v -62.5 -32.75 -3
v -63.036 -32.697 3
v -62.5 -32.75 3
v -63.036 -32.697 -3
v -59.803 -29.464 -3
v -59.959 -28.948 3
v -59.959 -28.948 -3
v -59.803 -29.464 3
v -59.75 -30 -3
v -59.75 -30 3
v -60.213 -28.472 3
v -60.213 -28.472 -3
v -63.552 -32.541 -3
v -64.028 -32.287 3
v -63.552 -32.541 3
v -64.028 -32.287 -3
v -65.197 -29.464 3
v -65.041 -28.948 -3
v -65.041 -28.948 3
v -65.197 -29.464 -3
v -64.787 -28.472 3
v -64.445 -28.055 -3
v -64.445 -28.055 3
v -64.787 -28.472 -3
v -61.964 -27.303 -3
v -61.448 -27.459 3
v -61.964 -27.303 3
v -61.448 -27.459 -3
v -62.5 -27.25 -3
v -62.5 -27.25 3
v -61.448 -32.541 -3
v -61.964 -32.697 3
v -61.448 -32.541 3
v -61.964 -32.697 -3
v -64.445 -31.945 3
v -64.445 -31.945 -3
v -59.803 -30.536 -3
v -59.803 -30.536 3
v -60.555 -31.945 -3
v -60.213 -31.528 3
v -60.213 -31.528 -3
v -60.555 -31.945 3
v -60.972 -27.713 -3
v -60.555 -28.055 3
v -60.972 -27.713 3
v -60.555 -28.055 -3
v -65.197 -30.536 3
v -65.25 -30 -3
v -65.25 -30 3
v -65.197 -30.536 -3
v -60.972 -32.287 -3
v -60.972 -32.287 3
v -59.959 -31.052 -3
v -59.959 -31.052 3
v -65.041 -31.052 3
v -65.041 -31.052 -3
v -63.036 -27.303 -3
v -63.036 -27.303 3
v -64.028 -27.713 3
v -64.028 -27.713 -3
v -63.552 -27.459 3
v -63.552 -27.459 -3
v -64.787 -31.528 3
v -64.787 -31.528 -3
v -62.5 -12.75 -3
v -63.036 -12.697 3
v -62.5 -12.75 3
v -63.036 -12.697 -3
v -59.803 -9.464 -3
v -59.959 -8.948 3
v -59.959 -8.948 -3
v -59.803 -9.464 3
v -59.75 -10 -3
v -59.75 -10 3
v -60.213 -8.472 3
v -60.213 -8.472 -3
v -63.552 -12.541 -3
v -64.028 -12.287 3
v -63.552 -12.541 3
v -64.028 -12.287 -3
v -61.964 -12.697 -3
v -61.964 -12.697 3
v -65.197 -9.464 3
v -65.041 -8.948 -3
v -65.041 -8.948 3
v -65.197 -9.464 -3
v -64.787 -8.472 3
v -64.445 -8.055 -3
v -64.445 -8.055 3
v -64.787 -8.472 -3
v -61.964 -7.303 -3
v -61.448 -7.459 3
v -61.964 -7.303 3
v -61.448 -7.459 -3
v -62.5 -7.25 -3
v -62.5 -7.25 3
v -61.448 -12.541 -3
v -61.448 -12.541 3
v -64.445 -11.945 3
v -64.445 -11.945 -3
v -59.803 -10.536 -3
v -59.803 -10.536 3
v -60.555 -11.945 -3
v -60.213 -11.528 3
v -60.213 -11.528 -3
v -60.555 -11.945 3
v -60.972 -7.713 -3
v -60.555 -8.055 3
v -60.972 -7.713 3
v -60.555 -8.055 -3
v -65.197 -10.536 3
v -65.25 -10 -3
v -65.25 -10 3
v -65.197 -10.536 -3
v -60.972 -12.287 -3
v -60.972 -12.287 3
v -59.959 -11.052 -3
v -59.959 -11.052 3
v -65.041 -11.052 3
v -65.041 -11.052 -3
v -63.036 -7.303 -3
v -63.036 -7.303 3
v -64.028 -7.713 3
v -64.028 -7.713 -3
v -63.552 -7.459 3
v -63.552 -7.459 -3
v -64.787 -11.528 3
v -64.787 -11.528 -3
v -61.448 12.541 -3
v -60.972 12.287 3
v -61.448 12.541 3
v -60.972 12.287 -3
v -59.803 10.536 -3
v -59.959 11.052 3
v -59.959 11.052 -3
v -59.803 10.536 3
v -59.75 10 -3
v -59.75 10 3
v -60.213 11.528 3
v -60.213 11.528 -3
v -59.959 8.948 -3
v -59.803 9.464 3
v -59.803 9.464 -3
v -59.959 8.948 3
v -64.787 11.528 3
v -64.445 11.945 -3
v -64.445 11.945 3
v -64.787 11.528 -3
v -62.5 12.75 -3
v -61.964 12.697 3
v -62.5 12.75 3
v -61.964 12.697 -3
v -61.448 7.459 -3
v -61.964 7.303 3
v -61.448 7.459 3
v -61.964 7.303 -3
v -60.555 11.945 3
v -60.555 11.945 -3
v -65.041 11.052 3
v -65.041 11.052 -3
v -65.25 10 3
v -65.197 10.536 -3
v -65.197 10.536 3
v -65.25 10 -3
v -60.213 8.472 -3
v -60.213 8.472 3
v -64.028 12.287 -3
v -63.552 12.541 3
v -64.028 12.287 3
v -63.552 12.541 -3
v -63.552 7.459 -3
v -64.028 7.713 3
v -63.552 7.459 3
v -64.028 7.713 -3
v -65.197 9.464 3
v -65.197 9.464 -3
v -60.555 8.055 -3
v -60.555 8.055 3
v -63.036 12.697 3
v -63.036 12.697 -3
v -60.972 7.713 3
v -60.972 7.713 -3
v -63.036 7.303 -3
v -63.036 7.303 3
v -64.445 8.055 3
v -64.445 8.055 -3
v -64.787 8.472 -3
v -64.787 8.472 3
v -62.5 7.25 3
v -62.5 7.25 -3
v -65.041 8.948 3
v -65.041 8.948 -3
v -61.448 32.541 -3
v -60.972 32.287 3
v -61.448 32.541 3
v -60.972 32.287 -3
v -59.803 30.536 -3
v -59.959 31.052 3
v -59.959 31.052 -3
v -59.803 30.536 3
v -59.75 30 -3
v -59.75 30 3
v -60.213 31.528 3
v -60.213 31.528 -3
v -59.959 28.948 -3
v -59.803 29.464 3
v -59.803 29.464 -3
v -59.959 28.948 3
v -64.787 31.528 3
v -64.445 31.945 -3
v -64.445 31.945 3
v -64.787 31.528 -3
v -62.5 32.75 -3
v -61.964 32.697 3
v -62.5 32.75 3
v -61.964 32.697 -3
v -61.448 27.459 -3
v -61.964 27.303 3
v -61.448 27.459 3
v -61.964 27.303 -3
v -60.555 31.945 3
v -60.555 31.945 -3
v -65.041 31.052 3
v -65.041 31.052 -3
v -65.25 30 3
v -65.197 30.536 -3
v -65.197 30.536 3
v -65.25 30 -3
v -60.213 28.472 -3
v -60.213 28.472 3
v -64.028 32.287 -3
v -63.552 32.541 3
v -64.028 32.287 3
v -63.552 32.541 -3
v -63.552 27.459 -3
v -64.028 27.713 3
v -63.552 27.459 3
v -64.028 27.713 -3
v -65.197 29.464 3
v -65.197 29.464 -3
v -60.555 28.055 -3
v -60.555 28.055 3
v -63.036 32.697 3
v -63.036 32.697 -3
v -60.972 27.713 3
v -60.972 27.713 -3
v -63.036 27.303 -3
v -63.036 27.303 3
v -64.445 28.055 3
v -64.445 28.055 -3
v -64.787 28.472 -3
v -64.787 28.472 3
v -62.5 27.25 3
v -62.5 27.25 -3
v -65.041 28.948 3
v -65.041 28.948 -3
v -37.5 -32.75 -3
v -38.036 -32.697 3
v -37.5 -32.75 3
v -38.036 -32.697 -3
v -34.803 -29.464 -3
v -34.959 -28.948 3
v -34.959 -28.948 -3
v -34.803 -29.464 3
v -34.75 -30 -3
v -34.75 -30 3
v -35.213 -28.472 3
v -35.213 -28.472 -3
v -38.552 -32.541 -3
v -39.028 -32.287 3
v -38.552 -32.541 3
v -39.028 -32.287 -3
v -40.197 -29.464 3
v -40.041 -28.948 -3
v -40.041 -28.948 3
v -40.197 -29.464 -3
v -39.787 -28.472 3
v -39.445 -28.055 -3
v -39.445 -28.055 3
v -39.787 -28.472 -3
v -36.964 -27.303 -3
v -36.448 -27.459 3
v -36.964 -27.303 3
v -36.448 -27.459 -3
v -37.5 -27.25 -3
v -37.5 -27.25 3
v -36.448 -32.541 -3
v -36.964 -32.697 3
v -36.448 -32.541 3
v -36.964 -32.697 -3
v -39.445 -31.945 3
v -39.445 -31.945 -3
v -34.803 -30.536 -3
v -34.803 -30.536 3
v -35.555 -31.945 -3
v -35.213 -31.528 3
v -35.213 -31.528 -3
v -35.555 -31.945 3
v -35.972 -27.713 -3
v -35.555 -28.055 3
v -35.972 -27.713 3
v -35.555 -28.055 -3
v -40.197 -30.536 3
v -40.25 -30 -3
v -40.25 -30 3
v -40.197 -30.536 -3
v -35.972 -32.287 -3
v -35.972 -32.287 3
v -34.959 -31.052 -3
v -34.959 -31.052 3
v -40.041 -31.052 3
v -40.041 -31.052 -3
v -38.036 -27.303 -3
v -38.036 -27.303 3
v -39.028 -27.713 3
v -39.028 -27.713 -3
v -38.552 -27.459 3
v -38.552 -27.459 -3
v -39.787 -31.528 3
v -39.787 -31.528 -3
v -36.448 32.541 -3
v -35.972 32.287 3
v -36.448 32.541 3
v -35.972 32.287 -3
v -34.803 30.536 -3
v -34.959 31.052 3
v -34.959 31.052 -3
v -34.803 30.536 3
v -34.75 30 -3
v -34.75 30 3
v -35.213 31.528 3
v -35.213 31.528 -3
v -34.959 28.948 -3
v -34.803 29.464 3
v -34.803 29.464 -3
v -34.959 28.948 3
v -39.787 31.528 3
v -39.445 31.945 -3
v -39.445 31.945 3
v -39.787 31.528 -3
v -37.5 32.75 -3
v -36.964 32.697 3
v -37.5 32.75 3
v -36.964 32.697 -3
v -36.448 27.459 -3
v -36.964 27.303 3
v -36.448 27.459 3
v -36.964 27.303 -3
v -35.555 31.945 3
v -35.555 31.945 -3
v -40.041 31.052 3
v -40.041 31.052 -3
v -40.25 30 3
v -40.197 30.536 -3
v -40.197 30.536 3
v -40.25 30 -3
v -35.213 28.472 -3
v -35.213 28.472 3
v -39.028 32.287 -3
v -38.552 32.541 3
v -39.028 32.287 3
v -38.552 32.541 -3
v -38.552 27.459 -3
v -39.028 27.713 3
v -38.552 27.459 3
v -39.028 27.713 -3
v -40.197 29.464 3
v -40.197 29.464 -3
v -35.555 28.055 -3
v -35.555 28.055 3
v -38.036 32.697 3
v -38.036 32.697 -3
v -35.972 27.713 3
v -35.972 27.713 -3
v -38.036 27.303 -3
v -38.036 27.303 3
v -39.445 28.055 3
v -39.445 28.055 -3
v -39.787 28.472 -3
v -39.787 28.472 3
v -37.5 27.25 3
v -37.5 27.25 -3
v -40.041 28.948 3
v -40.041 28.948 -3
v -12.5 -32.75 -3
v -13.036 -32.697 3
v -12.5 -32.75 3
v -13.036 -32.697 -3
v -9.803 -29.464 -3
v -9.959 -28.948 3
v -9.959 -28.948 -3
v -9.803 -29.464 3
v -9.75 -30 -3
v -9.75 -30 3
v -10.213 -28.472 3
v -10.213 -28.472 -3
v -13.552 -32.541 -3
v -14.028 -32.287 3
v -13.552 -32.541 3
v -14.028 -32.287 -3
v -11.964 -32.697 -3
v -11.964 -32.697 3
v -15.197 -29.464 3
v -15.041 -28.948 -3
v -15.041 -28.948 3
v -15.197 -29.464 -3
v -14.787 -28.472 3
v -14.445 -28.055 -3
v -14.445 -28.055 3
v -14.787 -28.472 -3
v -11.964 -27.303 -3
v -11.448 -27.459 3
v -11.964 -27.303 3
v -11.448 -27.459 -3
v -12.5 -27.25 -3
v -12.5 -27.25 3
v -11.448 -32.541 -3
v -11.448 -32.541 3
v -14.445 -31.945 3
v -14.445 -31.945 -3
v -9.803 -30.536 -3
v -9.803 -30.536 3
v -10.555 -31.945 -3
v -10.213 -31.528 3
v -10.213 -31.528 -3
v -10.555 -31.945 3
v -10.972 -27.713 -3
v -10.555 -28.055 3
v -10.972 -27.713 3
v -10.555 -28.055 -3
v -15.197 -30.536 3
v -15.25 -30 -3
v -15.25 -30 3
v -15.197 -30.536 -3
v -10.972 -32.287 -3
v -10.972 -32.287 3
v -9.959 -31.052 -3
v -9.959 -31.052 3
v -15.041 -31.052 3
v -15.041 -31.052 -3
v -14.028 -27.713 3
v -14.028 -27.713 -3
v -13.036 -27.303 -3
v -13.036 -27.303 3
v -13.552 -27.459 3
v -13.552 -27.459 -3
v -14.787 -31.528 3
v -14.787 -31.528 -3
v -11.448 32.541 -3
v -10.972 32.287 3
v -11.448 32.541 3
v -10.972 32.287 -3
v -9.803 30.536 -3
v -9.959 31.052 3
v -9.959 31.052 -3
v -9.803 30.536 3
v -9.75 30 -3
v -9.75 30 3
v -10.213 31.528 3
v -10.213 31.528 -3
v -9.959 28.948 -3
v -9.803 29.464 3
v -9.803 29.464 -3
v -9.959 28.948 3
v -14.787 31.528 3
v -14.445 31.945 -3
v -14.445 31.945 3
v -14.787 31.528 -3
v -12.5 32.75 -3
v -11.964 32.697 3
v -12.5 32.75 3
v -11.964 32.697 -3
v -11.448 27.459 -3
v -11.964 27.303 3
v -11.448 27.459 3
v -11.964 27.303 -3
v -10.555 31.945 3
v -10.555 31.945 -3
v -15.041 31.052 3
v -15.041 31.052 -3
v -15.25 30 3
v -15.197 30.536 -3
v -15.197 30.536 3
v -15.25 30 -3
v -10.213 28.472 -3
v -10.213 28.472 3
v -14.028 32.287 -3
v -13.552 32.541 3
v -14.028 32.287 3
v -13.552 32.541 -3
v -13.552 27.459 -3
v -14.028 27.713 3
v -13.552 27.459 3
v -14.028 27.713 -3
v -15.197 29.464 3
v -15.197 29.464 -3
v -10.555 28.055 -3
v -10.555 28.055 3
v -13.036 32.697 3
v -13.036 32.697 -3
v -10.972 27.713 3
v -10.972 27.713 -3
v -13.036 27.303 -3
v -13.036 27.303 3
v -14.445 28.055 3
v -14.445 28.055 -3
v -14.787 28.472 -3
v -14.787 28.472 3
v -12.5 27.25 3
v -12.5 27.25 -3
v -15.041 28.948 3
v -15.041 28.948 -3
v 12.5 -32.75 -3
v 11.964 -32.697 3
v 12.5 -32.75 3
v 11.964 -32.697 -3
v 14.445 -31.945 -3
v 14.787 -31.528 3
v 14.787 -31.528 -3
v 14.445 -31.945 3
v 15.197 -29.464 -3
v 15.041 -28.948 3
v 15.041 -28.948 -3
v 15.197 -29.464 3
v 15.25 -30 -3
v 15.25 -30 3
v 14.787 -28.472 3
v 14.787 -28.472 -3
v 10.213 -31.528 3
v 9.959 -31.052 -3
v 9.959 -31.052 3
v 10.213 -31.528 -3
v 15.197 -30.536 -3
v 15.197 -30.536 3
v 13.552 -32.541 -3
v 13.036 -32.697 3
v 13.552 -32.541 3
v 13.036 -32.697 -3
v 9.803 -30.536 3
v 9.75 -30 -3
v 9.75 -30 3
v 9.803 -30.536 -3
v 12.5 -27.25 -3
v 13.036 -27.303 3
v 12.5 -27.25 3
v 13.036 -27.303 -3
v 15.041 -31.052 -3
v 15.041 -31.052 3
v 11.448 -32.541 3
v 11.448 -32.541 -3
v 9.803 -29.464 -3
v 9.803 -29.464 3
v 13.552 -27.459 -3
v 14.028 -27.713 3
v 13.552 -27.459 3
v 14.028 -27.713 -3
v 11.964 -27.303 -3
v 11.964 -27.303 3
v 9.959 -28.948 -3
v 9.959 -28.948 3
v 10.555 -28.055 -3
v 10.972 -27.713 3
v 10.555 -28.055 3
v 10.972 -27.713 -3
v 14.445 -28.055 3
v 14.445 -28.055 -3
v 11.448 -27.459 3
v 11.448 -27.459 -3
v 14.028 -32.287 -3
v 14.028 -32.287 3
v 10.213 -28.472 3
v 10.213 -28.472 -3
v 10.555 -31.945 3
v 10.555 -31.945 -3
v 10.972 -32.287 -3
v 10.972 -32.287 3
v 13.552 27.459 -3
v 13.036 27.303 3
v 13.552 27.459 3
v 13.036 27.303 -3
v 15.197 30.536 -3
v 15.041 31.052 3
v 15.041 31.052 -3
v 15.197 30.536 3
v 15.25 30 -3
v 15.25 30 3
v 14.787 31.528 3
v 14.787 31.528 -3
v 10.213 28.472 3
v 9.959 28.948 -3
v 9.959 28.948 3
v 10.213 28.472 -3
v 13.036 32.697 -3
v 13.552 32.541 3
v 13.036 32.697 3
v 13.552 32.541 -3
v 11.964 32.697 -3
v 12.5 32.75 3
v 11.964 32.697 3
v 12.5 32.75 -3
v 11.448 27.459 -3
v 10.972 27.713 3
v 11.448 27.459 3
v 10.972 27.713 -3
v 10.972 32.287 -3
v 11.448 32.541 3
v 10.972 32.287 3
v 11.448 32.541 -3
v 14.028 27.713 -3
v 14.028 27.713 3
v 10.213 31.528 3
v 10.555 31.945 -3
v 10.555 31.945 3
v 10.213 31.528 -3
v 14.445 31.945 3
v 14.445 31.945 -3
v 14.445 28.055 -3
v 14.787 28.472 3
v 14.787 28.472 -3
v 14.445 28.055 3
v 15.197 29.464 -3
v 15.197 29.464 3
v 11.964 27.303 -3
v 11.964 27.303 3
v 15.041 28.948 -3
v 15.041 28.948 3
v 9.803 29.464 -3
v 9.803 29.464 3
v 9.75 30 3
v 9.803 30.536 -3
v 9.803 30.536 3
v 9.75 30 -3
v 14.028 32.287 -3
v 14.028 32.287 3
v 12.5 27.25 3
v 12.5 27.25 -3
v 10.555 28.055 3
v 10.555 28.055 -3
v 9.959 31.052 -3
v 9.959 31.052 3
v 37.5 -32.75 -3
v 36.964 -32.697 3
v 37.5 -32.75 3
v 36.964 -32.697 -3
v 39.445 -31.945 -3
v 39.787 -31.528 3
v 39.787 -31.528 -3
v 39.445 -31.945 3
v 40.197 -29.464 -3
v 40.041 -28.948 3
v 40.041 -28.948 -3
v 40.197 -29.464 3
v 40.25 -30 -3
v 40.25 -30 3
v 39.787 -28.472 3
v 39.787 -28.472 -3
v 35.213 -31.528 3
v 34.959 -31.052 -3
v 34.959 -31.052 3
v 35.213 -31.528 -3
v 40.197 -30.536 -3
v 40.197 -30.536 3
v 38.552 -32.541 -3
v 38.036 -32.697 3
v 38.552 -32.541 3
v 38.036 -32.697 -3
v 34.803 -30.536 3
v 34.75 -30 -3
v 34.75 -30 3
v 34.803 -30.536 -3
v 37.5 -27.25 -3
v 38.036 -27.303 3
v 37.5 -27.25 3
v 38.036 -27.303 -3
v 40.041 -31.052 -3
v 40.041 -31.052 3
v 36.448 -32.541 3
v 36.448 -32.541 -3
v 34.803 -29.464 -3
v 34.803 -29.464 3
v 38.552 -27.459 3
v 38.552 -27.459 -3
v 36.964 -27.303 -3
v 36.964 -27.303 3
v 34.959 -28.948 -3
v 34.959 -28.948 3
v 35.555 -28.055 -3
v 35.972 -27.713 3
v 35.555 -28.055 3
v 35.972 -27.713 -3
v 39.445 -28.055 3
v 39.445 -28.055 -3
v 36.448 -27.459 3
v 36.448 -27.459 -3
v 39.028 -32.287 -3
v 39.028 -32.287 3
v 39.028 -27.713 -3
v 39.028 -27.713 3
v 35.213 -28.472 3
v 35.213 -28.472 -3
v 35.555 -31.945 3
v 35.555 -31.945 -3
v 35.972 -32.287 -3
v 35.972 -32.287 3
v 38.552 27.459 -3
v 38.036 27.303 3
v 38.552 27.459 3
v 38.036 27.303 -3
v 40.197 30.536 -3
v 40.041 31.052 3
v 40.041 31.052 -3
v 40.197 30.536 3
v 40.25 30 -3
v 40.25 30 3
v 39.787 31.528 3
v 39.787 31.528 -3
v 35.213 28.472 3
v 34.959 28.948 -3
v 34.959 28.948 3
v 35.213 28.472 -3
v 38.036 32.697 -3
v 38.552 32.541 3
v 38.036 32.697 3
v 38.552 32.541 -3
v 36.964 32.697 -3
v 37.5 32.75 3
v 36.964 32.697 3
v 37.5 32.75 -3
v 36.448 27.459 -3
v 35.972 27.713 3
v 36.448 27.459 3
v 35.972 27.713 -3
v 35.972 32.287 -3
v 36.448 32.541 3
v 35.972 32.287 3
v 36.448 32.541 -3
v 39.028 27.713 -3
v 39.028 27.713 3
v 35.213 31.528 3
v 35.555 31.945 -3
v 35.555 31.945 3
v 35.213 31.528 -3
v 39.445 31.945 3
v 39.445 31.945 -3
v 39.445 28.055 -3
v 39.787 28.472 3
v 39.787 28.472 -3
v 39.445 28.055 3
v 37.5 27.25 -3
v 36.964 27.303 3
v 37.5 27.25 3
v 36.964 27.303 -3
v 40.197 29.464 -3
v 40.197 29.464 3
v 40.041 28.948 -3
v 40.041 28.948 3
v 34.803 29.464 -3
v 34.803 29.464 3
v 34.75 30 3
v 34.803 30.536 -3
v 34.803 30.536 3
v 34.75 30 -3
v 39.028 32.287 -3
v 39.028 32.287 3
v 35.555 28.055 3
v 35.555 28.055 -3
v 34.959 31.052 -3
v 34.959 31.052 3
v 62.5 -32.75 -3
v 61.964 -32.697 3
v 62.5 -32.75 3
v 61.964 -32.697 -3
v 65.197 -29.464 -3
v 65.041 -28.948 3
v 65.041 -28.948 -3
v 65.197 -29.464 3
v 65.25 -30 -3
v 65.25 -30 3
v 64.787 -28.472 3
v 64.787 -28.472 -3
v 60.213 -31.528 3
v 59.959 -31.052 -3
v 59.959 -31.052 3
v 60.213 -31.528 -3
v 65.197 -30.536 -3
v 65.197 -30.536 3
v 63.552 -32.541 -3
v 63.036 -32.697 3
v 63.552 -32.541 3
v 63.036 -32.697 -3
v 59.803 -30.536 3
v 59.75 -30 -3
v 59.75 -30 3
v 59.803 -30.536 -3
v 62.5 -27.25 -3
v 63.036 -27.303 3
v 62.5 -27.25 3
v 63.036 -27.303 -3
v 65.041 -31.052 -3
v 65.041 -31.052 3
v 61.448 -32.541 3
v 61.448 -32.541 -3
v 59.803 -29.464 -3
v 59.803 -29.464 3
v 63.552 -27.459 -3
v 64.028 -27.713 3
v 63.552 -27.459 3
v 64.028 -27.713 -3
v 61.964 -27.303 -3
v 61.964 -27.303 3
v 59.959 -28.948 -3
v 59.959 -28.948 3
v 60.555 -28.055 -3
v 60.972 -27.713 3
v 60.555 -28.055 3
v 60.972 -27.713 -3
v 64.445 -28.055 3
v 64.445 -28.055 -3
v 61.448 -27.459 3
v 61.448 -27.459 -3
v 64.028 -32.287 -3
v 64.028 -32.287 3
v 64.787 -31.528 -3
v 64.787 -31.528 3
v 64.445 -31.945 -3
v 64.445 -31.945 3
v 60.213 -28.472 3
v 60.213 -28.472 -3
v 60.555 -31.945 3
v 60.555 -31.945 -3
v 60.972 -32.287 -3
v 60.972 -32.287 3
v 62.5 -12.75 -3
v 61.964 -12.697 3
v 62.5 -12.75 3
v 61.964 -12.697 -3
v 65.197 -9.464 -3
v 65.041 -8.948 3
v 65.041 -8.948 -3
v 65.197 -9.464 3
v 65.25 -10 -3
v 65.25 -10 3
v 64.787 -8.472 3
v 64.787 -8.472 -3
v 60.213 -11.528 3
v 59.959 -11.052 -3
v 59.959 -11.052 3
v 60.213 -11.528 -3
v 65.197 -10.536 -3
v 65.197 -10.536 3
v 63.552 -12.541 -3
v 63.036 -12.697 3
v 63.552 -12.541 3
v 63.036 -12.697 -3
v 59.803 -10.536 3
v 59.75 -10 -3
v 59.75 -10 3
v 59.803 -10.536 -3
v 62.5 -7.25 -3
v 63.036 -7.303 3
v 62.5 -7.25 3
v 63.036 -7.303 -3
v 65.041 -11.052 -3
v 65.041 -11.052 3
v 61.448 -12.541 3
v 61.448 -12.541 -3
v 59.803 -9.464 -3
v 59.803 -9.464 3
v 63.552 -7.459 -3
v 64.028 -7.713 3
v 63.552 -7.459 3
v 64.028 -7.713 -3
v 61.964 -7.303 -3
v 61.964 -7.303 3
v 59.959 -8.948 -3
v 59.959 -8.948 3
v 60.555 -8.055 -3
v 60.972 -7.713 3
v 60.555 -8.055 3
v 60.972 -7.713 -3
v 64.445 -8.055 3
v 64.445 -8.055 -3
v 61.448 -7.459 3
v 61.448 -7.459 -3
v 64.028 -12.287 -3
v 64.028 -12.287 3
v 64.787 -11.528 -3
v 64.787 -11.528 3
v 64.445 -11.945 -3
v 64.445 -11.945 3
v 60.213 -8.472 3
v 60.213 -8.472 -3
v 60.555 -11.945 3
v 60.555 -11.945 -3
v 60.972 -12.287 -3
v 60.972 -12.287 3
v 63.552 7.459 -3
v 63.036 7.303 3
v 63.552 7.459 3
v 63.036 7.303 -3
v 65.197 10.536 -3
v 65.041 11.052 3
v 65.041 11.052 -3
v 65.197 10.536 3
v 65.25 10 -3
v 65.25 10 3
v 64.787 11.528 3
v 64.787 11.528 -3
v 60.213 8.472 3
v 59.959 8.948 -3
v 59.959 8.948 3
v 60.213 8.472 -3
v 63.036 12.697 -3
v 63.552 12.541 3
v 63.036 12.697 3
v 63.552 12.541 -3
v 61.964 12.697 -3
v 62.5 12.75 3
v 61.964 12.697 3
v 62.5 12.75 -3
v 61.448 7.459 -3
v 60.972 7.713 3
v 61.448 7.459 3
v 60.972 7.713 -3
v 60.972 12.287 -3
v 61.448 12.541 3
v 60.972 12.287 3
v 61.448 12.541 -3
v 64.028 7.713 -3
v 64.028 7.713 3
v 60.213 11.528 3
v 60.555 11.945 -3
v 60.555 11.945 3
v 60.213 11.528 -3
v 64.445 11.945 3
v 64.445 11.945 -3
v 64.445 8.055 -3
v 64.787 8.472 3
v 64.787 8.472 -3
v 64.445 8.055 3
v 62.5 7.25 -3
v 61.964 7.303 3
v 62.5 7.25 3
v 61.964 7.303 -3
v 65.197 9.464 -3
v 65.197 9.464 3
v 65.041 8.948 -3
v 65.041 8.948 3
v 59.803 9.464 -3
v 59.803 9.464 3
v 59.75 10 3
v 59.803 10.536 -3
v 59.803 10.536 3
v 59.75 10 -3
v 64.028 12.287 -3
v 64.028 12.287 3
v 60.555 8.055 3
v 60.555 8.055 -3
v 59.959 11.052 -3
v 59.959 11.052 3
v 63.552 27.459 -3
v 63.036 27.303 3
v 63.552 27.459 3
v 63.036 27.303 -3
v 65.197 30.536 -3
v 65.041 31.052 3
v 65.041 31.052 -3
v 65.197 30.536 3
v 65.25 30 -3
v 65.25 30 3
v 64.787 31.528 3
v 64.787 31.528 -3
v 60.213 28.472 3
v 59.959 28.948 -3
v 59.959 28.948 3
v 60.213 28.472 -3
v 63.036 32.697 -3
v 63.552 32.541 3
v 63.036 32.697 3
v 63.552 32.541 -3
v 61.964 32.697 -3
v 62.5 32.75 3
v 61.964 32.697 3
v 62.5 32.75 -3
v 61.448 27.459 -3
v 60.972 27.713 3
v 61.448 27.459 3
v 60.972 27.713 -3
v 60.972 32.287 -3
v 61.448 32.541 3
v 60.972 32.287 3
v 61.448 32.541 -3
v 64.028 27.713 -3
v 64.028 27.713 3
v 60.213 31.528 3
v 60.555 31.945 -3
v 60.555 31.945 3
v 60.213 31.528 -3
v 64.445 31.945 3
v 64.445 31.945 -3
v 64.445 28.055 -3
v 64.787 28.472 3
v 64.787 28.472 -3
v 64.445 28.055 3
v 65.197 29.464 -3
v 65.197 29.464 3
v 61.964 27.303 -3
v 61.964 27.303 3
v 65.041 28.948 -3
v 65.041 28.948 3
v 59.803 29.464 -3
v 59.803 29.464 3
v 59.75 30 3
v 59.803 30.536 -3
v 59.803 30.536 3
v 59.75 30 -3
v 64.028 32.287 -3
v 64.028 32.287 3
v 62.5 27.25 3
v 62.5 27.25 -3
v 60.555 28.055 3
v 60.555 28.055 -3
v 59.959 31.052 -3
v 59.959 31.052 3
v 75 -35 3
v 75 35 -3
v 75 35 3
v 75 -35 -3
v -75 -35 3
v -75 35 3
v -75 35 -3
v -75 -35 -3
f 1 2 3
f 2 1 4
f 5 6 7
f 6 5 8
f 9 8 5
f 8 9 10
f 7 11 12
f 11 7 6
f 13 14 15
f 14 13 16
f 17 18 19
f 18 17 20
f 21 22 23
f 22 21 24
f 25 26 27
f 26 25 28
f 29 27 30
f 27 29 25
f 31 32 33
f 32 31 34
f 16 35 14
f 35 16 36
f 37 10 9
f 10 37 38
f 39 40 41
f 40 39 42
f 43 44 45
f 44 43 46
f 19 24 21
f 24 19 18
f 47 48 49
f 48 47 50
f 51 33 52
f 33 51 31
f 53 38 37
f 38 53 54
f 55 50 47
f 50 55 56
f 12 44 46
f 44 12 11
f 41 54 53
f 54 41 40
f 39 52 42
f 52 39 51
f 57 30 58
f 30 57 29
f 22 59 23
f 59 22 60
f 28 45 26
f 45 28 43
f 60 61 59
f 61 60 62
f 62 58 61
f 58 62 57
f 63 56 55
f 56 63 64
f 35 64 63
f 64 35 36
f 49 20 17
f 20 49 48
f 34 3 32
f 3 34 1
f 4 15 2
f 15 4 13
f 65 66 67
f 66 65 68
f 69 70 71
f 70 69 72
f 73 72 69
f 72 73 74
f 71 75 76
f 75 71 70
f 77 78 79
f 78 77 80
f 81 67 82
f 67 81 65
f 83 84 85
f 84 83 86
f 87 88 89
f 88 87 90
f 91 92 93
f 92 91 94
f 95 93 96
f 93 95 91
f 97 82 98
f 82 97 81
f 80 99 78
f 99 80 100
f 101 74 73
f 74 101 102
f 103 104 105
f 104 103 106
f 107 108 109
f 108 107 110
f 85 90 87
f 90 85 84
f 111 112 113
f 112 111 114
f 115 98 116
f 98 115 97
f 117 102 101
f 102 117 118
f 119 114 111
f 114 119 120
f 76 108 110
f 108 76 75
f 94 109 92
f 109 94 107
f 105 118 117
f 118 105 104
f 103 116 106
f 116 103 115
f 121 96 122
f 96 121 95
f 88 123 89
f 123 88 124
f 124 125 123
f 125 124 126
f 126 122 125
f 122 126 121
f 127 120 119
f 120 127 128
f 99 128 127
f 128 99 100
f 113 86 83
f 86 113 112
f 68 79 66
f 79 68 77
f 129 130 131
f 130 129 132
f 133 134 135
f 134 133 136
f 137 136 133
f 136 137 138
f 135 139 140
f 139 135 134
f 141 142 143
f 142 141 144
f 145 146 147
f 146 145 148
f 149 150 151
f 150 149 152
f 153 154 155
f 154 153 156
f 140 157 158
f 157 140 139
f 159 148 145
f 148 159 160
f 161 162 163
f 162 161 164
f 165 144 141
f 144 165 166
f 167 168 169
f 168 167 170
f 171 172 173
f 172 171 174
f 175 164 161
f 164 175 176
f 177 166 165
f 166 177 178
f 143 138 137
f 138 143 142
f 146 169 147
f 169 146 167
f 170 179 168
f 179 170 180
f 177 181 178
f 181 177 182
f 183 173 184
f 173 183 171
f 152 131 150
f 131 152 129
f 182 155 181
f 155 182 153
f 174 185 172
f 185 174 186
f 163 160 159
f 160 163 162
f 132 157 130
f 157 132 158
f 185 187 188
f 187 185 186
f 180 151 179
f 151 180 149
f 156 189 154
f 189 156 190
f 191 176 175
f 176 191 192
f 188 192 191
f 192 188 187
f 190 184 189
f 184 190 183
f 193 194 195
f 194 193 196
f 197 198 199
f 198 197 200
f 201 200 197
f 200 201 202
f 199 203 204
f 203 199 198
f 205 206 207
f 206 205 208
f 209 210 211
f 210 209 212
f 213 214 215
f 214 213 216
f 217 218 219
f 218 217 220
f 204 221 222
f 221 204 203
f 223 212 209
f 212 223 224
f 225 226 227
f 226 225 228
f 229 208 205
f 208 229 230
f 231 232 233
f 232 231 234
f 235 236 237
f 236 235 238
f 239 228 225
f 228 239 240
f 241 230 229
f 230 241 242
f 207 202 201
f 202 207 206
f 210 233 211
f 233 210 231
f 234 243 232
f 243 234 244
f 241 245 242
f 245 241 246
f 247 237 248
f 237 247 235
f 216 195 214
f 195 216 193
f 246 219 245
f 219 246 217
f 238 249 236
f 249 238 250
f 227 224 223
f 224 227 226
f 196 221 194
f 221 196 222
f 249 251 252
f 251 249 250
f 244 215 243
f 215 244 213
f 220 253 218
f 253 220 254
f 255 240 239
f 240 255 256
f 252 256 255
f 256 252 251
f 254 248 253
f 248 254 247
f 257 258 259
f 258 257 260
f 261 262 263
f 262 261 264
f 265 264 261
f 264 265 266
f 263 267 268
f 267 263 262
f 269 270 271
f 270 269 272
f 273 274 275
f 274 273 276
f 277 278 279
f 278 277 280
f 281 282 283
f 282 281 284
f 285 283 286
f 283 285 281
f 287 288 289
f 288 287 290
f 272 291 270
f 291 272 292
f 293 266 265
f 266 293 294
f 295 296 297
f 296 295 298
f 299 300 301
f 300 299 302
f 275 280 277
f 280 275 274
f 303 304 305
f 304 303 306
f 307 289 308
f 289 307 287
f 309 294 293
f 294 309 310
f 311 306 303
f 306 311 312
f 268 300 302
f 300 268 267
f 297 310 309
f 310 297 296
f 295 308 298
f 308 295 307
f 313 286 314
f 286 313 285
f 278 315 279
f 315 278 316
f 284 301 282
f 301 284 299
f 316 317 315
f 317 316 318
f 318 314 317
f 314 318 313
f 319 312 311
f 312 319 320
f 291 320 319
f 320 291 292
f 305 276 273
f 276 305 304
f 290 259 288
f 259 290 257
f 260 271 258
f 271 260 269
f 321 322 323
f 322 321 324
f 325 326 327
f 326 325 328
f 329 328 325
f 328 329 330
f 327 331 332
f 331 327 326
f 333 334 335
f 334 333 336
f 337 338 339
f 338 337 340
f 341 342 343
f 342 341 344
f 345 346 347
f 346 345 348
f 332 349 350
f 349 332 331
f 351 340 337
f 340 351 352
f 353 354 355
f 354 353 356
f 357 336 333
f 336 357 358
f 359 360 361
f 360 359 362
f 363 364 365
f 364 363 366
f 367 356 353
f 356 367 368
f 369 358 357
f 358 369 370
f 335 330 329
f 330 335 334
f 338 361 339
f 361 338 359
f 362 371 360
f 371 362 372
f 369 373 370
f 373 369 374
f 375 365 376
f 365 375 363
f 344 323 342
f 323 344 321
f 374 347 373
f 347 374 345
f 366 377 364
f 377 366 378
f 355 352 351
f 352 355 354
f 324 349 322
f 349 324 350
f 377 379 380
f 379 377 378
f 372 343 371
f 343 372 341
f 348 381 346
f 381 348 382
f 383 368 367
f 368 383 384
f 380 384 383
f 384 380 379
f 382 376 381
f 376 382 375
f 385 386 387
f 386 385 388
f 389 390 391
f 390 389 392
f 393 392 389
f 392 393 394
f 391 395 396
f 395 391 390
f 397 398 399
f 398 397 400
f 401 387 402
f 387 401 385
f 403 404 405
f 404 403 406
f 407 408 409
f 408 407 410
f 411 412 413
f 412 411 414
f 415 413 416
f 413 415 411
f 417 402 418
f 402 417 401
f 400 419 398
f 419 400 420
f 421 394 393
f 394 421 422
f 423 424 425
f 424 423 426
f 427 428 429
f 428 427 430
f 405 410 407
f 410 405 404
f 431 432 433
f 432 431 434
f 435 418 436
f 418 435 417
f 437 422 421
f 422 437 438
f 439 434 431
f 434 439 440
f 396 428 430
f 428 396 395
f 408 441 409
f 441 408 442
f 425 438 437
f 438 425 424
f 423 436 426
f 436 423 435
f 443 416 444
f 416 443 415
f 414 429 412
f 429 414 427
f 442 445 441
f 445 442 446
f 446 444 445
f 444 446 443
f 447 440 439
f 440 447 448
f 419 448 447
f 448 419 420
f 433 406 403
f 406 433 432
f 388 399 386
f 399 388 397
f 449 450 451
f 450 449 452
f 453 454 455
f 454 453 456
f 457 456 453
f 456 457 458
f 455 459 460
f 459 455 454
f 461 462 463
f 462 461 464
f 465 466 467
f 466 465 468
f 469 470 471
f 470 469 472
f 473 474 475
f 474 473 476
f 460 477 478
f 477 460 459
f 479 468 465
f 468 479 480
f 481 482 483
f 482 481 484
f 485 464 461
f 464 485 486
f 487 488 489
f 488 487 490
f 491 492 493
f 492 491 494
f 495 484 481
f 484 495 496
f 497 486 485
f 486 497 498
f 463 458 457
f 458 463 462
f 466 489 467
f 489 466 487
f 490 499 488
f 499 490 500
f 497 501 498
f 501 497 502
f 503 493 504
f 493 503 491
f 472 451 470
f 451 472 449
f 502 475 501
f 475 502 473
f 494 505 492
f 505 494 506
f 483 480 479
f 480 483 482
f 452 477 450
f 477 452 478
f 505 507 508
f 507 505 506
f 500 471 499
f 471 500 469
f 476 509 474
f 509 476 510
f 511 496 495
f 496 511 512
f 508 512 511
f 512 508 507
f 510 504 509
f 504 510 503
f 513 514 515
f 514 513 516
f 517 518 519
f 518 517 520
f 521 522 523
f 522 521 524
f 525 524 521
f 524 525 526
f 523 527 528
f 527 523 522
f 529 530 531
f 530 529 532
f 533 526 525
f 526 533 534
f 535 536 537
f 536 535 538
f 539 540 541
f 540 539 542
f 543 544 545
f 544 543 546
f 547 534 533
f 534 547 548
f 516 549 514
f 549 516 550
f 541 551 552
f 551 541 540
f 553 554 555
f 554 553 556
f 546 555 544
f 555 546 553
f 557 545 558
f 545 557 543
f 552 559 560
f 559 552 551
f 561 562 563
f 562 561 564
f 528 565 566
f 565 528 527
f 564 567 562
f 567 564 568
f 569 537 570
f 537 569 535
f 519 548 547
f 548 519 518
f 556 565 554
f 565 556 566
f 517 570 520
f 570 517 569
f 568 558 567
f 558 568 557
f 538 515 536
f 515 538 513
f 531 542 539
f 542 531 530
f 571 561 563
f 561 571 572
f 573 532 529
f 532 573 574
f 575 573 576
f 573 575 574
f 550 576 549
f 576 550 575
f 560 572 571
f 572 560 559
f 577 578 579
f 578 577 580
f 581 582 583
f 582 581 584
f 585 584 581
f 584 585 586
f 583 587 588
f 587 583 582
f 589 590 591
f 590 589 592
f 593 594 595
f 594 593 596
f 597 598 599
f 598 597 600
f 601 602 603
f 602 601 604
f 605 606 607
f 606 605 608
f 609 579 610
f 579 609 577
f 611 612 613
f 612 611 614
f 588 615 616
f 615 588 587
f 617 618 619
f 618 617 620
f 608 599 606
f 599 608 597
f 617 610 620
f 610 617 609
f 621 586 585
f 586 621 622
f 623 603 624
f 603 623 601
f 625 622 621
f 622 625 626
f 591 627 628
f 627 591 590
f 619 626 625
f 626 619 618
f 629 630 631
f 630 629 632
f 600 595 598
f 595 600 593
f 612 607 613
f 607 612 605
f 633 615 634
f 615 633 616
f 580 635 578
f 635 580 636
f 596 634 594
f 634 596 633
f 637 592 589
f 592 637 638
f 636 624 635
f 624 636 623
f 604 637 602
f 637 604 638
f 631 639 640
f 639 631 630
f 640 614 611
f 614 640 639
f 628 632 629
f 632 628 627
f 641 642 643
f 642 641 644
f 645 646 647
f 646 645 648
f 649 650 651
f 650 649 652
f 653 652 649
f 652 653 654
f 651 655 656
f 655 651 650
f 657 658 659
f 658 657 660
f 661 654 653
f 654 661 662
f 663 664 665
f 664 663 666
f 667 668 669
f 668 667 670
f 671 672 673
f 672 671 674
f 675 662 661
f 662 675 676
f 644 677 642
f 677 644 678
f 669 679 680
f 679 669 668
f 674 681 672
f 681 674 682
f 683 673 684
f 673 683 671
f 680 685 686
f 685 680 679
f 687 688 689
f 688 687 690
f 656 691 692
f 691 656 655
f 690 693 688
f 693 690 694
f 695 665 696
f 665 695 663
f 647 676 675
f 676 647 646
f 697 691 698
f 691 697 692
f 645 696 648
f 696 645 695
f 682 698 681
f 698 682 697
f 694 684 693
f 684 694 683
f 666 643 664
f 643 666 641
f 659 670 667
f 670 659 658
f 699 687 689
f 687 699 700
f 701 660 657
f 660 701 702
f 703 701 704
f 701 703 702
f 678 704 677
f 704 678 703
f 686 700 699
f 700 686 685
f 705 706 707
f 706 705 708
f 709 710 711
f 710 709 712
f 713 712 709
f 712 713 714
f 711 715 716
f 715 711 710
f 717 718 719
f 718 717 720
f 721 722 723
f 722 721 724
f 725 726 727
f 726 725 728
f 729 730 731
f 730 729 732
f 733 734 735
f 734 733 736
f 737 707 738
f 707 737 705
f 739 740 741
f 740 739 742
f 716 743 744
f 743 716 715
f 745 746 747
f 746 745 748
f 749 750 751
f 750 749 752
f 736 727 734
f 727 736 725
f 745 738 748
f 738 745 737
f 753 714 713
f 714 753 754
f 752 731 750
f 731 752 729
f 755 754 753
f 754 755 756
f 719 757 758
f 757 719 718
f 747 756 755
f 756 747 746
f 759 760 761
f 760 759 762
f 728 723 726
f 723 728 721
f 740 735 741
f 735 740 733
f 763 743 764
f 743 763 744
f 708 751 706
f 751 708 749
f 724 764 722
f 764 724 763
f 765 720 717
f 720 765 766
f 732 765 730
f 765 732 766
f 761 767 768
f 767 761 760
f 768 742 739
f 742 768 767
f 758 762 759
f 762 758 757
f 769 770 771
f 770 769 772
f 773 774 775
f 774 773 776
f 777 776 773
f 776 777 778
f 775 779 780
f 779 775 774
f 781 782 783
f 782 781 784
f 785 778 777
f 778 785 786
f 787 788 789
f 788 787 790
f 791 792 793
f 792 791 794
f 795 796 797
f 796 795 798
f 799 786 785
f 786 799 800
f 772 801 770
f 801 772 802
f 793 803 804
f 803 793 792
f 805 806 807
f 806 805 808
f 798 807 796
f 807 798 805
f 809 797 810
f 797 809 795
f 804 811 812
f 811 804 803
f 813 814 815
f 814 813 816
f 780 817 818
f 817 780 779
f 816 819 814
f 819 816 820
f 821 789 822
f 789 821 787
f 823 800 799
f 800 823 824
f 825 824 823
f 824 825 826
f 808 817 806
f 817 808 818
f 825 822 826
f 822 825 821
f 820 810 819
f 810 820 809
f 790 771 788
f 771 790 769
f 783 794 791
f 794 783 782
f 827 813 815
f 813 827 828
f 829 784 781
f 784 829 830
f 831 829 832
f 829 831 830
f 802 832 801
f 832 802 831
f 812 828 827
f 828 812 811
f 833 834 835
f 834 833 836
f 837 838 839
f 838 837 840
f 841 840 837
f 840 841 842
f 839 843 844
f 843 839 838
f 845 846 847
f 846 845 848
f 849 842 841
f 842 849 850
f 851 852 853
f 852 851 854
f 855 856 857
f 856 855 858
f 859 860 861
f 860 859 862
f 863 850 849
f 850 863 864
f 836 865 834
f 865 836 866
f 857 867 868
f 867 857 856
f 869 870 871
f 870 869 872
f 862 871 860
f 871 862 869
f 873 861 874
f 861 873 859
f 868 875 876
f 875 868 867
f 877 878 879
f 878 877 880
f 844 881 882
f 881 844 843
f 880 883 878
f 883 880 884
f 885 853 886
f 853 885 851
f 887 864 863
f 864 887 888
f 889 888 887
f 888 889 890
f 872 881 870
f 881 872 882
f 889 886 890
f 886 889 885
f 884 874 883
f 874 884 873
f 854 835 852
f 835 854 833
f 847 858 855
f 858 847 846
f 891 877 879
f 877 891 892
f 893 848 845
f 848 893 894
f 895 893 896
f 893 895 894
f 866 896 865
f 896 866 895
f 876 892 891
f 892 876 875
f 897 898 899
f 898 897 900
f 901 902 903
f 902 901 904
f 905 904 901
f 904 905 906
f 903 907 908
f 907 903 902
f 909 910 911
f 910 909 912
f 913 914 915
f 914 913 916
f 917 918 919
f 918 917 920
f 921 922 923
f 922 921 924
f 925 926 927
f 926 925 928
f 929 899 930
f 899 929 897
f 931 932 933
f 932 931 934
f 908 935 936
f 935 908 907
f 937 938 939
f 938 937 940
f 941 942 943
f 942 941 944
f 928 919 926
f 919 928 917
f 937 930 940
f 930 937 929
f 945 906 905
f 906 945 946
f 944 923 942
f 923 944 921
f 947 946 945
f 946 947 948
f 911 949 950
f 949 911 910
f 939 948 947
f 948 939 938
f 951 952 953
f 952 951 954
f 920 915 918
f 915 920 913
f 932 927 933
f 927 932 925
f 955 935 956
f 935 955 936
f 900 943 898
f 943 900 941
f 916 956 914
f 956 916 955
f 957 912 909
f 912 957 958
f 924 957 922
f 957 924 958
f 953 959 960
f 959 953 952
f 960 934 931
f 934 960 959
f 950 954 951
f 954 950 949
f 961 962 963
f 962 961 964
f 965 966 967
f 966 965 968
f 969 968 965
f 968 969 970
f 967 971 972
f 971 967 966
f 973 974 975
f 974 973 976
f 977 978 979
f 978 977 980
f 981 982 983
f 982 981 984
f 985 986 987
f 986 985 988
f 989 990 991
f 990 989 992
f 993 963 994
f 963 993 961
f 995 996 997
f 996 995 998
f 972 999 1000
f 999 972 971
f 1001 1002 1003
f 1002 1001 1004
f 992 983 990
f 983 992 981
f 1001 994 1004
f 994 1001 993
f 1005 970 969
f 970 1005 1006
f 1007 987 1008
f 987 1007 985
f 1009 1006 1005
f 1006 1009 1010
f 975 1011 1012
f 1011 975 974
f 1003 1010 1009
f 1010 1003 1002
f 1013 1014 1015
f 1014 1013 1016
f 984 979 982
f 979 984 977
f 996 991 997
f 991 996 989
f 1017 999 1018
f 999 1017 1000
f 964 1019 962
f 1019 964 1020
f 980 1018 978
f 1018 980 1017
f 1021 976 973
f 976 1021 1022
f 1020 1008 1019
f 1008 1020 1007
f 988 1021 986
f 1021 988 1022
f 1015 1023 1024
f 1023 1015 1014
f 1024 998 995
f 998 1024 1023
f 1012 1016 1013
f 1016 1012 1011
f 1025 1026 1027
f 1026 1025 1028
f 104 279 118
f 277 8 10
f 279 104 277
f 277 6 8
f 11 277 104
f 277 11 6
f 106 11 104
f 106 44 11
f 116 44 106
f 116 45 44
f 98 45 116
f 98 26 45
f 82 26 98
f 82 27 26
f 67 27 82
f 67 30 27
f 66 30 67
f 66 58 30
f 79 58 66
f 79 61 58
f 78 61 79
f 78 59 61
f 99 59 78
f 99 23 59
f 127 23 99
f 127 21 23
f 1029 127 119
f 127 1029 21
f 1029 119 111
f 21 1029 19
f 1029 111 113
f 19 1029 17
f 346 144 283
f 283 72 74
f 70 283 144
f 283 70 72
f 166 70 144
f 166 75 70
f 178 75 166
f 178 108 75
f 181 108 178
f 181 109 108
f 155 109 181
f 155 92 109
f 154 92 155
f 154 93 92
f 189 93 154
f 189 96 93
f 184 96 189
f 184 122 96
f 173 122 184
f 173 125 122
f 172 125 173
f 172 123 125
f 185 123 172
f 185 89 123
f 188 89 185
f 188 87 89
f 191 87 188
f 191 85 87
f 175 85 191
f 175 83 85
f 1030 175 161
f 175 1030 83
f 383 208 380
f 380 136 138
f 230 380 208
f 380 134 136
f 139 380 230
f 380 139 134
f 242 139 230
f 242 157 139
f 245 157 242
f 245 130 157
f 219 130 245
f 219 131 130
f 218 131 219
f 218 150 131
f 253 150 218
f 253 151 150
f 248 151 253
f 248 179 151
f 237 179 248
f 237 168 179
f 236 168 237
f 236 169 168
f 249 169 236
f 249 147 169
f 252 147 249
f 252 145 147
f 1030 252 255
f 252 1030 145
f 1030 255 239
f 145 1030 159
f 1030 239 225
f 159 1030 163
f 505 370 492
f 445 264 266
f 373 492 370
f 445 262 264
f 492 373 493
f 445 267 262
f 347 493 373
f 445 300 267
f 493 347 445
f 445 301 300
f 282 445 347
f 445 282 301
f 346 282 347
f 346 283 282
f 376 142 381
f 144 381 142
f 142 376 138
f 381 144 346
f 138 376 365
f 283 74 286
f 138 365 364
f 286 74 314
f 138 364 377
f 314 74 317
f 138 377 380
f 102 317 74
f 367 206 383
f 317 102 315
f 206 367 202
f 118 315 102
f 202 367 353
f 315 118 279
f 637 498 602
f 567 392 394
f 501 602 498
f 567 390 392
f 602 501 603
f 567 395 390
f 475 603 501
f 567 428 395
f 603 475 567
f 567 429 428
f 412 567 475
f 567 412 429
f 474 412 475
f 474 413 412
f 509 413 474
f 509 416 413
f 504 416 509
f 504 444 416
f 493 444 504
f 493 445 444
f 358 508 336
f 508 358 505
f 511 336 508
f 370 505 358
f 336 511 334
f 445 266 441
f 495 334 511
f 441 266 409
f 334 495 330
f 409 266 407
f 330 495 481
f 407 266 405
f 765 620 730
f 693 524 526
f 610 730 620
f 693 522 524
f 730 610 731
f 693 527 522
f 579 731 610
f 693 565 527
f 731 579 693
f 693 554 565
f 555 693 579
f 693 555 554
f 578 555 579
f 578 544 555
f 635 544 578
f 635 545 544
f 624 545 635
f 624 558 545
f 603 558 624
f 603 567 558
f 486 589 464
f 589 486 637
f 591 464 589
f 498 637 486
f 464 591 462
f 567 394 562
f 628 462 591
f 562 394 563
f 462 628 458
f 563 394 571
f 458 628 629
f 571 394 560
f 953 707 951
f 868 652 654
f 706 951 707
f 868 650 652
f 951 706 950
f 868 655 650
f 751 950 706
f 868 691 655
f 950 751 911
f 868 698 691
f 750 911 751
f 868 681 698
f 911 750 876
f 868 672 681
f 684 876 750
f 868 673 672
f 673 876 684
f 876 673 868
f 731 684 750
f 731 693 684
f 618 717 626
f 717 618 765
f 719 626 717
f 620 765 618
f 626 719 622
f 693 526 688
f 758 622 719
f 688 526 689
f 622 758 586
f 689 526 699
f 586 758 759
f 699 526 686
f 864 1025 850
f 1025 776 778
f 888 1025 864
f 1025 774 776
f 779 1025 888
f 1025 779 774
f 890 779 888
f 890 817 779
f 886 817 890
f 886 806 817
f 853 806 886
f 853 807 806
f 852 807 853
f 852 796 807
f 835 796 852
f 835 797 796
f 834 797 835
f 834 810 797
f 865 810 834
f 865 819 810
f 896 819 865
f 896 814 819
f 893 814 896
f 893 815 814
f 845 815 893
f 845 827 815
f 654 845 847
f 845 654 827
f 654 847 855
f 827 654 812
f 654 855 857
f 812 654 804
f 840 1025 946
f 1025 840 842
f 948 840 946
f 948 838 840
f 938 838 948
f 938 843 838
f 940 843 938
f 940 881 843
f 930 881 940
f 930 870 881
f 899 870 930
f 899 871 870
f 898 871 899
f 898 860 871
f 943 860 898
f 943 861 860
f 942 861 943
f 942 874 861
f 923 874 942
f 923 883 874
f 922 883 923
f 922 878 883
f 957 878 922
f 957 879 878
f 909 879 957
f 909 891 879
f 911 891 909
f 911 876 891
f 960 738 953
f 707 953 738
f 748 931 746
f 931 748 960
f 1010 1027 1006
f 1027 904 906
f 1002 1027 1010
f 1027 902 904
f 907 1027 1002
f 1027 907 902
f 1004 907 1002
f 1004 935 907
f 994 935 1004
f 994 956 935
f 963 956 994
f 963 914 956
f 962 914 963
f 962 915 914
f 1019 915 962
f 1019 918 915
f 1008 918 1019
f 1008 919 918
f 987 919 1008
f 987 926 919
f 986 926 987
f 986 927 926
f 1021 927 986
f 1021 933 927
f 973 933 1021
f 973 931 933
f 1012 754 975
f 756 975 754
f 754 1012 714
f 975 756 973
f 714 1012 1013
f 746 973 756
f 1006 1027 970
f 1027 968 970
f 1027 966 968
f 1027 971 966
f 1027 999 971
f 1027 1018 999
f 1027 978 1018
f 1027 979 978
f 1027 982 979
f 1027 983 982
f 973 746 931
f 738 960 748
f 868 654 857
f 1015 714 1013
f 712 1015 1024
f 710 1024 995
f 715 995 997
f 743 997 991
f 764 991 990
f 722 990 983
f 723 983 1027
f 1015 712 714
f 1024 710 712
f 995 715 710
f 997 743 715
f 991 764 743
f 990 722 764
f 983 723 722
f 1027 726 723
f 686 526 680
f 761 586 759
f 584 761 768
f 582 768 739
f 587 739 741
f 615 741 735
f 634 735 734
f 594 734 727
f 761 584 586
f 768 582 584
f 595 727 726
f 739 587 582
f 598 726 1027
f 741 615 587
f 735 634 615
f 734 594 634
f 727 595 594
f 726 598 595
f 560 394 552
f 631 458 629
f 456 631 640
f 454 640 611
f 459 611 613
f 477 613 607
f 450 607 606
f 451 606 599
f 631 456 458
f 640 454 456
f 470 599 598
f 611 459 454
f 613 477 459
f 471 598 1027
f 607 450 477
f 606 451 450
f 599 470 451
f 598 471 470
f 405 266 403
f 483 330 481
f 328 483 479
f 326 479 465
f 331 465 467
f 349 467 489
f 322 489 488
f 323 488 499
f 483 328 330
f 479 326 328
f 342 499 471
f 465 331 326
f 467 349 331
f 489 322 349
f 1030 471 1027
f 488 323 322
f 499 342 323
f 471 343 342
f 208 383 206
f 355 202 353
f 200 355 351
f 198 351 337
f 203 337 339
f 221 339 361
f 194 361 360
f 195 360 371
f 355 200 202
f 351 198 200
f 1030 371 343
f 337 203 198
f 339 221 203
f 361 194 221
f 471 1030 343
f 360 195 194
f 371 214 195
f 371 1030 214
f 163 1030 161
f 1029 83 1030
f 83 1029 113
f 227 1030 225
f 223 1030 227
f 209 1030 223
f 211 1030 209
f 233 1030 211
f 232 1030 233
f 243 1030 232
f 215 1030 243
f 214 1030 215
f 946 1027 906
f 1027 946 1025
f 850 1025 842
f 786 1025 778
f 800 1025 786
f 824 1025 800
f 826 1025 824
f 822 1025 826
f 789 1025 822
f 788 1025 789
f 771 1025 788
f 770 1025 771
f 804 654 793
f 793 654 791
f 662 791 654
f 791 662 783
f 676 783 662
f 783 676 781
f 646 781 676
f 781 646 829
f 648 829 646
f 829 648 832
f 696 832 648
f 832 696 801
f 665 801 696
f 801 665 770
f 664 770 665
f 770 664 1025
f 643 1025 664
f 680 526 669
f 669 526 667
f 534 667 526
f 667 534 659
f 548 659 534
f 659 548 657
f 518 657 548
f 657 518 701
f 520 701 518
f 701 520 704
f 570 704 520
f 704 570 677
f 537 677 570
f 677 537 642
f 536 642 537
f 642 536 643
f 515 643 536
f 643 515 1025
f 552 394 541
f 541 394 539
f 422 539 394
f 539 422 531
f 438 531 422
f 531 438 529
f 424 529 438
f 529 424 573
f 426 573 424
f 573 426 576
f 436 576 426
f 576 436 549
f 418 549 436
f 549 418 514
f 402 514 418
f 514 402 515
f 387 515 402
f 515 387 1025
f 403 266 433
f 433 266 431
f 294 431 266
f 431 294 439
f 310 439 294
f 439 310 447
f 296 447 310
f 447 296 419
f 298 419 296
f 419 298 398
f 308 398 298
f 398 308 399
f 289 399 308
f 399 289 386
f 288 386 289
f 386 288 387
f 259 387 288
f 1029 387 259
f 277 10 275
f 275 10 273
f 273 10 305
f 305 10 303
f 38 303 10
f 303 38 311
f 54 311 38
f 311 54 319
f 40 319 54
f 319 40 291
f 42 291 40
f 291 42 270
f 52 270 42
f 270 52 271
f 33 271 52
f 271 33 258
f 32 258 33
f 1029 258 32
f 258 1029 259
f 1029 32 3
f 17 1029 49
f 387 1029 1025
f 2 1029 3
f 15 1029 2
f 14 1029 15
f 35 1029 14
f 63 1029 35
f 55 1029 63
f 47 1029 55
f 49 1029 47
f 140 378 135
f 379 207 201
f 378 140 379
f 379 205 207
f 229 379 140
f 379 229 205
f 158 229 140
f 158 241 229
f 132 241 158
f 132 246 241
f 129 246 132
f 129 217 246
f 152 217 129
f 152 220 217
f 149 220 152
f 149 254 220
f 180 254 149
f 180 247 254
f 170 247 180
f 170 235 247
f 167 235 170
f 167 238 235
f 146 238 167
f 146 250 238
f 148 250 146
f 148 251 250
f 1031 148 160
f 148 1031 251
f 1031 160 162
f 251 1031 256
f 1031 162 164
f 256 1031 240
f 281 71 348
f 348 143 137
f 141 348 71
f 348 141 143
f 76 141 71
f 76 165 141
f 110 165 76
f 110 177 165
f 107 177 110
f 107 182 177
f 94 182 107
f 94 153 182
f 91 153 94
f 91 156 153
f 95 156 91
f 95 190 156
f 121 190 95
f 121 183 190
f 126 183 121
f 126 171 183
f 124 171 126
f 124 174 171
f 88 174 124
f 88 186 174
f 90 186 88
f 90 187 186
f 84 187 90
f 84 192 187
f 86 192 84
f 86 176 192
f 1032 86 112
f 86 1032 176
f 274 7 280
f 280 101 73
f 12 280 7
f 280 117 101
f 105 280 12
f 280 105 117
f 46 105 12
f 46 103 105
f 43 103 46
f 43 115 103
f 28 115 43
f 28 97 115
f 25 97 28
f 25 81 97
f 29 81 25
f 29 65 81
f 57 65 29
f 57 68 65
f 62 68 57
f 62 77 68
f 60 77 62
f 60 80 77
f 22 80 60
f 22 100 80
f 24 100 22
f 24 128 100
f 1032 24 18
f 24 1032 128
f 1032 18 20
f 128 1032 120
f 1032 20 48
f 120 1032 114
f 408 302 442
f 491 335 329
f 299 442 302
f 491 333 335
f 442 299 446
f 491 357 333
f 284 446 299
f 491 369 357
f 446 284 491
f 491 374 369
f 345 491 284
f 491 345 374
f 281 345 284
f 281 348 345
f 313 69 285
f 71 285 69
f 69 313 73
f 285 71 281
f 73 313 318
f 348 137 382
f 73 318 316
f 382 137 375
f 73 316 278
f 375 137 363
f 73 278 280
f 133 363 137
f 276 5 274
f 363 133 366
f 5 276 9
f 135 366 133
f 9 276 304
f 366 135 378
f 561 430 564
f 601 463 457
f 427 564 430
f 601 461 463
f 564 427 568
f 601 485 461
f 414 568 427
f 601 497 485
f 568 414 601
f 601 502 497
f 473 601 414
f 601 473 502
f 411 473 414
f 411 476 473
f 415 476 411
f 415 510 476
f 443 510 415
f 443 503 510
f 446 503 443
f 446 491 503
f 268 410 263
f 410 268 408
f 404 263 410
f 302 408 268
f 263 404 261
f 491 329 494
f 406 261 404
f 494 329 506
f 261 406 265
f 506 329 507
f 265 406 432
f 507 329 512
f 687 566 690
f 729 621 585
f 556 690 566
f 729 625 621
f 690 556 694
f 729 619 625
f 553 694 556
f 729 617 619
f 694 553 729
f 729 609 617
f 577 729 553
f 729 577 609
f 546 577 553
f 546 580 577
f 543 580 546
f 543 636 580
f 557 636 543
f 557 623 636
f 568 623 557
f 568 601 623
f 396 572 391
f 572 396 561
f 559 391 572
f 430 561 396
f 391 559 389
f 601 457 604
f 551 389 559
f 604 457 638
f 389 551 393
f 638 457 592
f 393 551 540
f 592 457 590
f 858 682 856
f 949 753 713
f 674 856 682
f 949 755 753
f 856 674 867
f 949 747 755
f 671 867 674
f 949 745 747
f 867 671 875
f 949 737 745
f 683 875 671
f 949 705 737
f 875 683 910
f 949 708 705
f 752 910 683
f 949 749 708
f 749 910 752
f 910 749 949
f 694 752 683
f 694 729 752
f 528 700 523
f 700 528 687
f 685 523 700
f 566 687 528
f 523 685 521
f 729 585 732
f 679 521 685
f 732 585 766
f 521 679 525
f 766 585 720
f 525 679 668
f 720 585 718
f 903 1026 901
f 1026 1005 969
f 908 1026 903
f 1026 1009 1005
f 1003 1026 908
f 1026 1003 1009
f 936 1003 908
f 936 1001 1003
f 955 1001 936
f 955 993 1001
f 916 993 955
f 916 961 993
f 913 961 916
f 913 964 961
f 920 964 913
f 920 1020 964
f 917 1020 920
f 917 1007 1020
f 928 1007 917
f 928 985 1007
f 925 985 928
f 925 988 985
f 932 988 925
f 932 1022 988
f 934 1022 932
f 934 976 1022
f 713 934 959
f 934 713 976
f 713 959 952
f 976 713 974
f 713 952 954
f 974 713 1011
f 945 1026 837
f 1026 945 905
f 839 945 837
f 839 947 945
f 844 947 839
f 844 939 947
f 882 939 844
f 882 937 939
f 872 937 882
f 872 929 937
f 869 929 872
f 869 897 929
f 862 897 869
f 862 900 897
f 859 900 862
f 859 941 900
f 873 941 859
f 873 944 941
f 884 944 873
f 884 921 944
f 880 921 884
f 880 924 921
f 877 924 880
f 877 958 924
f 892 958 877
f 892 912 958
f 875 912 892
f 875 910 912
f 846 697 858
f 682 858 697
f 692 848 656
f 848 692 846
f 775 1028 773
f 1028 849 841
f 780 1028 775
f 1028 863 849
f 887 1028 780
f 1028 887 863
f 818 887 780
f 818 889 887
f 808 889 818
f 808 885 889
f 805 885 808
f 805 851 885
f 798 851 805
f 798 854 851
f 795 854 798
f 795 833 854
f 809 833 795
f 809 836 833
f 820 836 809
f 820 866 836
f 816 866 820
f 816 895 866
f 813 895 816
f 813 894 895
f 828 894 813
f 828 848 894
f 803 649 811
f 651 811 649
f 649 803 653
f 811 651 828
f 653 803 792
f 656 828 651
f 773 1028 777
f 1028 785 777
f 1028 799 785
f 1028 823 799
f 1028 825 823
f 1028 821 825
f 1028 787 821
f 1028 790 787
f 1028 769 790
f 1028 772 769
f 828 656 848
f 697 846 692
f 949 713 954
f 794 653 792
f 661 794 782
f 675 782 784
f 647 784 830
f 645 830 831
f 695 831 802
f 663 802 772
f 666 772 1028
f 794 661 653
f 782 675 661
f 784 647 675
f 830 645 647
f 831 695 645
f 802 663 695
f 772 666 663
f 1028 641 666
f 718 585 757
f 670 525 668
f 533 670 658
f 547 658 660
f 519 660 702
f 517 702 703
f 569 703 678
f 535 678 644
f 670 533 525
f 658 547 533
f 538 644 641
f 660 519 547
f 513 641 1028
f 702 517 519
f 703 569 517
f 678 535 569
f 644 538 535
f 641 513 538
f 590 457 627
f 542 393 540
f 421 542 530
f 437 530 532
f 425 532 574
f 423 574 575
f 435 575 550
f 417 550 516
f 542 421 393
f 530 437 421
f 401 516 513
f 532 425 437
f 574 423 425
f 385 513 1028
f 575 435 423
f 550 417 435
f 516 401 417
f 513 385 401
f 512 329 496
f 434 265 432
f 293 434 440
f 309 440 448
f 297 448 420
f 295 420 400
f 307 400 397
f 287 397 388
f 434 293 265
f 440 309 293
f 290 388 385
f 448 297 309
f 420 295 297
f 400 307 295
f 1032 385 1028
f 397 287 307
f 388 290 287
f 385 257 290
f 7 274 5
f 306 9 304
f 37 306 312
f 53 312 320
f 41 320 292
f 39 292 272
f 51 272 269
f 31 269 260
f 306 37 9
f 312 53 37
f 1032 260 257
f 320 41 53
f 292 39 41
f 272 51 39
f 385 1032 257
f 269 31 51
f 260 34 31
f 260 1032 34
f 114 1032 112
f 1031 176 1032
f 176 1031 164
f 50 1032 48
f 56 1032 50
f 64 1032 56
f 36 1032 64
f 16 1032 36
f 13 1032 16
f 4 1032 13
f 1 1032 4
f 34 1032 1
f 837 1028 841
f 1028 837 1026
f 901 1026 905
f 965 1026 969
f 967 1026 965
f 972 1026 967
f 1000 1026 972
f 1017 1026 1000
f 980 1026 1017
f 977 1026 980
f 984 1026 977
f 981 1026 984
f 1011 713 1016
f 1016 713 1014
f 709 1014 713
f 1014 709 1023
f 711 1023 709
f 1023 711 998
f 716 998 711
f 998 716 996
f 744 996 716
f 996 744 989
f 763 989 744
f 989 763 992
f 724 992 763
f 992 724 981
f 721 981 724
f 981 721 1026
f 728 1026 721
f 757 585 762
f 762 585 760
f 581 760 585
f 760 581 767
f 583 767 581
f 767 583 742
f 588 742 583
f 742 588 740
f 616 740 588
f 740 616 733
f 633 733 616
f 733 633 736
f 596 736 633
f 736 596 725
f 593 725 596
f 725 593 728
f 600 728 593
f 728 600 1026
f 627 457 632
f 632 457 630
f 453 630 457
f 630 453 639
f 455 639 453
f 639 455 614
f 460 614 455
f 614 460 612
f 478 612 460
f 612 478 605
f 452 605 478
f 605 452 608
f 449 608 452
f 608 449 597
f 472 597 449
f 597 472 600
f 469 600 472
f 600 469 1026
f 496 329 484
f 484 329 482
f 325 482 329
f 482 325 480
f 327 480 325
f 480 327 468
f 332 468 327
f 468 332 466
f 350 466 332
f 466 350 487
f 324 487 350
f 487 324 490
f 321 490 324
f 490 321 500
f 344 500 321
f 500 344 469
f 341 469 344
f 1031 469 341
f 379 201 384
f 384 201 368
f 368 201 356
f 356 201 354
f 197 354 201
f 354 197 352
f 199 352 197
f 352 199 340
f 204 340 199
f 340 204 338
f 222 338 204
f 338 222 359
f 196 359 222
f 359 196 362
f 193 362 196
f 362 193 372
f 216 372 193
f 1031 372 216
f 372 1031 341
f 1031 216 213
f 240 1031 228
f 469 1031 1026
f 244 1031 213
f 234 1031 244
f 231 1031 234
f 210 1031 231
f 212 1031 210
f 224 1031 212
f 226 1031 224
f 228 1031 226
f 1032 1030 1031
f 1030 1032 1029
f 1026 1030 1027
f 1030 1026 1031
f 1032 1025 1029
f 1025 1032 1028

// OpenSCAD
$fn = 32;

// ----------------------------------------------------------------------
// Perforated panel 150 x 70 x 6
// 4 x 6 Ø5.5 holes, frame layout
// ----------------------------------------------------------------------

// --- parameters (mm) ---
panel = [150, 70, 6];  // overall size (x, y, z)
hole_d = 5.5;          // hole diameter
pitch_x = 25;          // hole pitch along X
pitch_y = 20;          // hole pitch along Y

// --- derived feature positions (mm) ---
margin = hole_d / 2 + 2;            // = 4.75   clearance from the panel edge
cols = floor((panel[0] - 2 * margin) / pitch_x) + 1;  // = 6   how many columns fit in X
rows = floor((panel[1] - 2 * margin) / pitch_y) + 1;  // = 4   how many rows fit in Y
span_x = (cols - 1) * pitch_x + 0;  // = 125   width of the field
span_y = (rows - 1) * pitch_y;      // = 60   height of the field
origin_x = -span_x / 2;             // = -62.5   X of the first hole
origin_y = -span_y / 2;             // = -30   Y of the first row
holes = 2 * cols + 2 * (rows - 2);  // = 16   holes around the frame
feature_centers = [
  [origin_x + 0 * pitch_x, origin_y + 0 * pitch_y],
  [origin_x + 0 * pitch_x, origin_y + 1 * pitch_y],
  [origin_x + 0 * pitch_x, origin_y + 2 * pitch_y],
  [origin_x + 0 * pitch_x, origin_y + 3 * pitch_y],
  [origin_x + 1 * pitch_x, origin_y + 0 * pitch_y],
  [origin_x + 1 * pitch_x, origin_y + 3 * pitch_y],
  [origin_x + 2 * pitch_x, origin_y + 0 * pitch_y],
  [origin_x + 2 * pitch_x, origin_y + 3 * pitch_y],
  [origin_x + 3 * pitch_x, origin_y + 0 * pitch_y],
  [origin_x + 3 * pitch_x, origin_y + 3 * pitch_y],
  [origin_x + 4 * pitch_x, origin_y + 0 * pitch_y],
  [origin_x + 4 * pitch_x, origin_y + 3 * pitch_y],
  [origin_x + 5 * pitch_x, origin_y + 0 * pitch_y],
  [origin_x + 5 * pitch_x, origin_y + 1 * pitch_y],
  [origin_x + 5 * pitch_x, origin_y + 2 * pitch_y],
  [origin_x + 5 * pitch_x, origin_y + 3 * pitch_y]
];   // hole centres, used verbatim by the cutter loop

// panel outline, every hole through
difference() {
  cube(panel, center = true);
  for (centre = feature_centers)
    translate([centre[0], centre[1], 0])
      cylinder(d = hole_d, h = panel[2] + 2, center = true);
}
